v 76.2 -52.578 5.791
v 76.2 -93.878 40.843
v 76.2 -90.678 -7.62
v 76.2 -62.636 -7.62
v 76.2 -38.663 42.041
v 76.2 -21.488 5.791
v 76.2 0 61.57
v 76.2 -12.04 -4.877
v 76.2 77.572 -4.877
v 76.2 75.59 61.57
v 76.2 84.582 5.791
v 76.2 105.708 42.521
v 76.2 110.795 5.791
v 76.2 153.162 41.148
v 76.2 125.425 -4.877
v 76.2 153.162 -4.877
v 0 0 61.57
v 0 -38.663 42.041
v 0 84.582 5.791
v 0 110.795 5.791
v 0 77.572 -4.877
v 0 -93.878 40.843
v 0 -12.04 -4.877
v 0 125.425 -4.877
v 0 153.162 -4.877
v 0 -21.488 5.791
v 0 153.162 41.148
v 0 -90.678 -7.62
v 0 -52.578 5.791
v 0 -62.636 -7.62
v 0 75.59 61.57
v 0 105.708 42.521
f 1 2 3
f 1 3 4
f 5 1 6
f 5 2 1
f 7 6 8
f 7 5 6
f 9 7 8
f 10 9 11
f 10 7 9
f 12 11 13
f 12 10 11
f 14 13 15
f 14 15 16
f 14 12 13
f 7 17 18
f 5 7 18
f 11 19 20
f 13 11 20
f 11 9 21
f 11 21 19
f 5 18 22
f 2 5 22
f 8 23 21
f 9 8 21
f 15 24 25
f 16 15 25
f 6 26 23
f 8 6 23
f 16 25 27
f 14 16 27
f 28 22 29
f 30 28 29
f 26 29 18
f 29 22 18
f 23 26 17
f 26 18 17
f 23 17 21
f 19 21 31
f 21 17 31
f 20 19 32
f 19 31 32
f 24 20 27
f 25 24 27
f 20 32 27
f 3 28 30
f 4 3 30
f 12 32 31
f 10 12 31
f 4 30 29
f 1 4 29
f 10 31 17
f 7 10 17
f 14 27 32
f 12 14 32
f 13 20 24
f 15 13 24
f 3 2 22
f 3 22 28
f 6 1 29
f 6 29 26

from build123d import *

# Parameters (mm, degrees)
F1_DEPTH = 76.2


with BuildPart() as f1:
    # F0 (on Right) → F1 (new body)
    with BuildSketch(Plane.YZ):
        Polygon((-93.878396, 40.8432), (-90.677999, -7.62), (-62.636398, -7.62), (-52.577998, 5.7912), (-21.4884, 5.7912), (-12.0396, -4.8768), (77.571601, -4.8768), (84.582001, 5.7912), (110.794805, 5.7912), (125.425205, -4.8768), (153.162003, -4.8768), (153.162003, 41.148003), (105.708321, 42.520983), (68.884805, 43.586399), (32.613605, 43.586399), (-38.662857, 42.040645), align=None)
        Polygon((0, 61.569601), (-38.662857, 42.040645), (32.613605, 43.586399), (68.884805, 43.586399), (105.708321, 42.520983), (75.590402, 61.569601), align=None)
    extrude(amount=F1_DEPTH)


solid = f1.part
